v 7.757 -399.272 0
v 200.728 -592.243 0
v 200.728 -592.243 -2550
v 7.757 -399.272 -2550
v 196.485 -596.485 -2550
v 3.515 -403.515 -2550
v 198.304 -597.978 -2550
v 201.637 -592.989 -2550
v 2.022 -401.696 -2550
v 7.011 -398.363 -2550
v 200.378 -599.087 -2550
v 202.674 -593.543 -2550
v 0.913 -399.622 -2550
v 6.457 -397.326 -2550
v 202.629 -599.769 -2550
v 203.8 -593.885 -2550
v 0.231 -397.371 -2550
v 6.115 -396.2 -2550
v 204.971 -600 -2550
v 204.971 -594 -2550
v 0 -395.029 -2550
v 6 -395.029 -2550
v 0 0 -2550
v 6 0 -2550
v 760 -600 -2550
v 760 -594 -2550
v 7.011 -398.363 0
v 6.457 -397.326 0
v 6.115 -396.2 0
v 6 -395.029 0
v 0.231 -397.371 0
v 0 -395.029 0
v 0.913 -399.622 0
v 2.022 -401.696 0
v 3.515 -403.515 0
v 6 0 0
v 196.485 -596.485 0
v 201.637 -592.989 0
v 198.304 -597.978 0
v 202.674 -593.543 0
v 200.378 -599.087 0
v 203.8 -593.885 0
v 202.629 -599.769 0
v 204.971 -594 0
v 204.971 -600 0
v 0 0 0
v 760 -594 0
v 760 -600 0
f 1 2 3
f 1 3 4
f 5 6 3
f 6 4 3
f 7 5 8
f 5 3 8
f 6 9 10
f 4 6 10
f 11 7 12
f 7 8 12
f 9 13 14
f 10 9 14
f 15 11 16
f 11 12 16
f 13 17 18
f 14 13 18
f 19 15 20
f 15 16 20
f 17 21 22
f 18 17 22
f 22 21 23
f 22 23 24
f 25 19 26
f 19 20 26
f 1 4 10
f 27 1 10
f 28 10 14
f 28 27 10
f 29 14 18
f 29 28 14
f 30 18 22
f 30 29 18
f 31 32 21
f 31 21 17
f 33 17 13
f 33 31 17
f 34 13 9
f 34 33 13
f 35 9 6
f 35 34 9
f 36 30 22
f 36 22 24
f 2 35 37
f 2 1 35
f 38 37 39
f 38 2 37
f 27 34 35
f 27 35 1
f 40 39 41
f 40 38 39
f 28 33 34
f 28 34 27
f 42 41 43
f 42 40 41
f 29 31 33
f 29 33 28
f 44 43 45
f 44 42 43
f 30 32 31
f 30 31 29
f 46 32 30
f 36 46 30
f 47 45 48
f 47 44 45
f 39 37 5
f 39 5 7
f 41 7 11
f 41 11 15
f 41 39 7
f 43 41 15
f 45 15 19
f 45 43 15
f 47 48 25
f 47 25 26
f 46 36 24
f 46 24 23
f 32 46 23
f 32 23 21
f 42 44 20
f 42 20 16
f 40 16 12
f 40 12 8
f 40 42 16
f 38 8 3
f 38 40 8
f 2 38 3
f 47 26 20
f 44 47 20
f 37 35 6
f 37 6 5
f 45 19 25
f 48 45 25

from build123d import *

# Parameters (mm, degrees)
TABAN_FLAN_1_DEPTH = 2550


# Sheet-metal steps are written as plain solids
with BuildPart() as part:
    # Çizim1 → Taban-Flanş1 (new body)
    with BuildSketch(Plane.XY):
        with BuildLine():
            Line((0, 0), (0, -395.029437252))
            ThreePointArc((0, -395.029437252), (0.91344561, -399.62163844), (3.514718626, -403.514718626))
            Line((3.514718626, -403.514718626), (196.485281374, -596.485281374))
            ThreePointArc((196.485281374, -596.485281374), (200.37836156, -599.08655439), (204.970562748, -600))
            Line((204.970562748, -600), (760, -600))
            Line((760, -600), (760, -594))
            Line((760, -594), (204.970562748, -594))
            ThreePointArc((204.970562748, -594), (202.674462154, -593.543277195), (200.727922061, -592.242640687))
            Line((200.727922061, -592.242640687), (7.757359313, -399.272077939))
            ThreePointArc((7.757359313, -399.272077939), (6.456722805, -397.325537846), (6, -395.029437252))
            Line((6, -395.029437252), (6, 0))
            Line((6, 0), (0, 0))
        make_face()
    extrude(amount=-TABAN_FLAN_1_DEPTH)


solid = part.part
